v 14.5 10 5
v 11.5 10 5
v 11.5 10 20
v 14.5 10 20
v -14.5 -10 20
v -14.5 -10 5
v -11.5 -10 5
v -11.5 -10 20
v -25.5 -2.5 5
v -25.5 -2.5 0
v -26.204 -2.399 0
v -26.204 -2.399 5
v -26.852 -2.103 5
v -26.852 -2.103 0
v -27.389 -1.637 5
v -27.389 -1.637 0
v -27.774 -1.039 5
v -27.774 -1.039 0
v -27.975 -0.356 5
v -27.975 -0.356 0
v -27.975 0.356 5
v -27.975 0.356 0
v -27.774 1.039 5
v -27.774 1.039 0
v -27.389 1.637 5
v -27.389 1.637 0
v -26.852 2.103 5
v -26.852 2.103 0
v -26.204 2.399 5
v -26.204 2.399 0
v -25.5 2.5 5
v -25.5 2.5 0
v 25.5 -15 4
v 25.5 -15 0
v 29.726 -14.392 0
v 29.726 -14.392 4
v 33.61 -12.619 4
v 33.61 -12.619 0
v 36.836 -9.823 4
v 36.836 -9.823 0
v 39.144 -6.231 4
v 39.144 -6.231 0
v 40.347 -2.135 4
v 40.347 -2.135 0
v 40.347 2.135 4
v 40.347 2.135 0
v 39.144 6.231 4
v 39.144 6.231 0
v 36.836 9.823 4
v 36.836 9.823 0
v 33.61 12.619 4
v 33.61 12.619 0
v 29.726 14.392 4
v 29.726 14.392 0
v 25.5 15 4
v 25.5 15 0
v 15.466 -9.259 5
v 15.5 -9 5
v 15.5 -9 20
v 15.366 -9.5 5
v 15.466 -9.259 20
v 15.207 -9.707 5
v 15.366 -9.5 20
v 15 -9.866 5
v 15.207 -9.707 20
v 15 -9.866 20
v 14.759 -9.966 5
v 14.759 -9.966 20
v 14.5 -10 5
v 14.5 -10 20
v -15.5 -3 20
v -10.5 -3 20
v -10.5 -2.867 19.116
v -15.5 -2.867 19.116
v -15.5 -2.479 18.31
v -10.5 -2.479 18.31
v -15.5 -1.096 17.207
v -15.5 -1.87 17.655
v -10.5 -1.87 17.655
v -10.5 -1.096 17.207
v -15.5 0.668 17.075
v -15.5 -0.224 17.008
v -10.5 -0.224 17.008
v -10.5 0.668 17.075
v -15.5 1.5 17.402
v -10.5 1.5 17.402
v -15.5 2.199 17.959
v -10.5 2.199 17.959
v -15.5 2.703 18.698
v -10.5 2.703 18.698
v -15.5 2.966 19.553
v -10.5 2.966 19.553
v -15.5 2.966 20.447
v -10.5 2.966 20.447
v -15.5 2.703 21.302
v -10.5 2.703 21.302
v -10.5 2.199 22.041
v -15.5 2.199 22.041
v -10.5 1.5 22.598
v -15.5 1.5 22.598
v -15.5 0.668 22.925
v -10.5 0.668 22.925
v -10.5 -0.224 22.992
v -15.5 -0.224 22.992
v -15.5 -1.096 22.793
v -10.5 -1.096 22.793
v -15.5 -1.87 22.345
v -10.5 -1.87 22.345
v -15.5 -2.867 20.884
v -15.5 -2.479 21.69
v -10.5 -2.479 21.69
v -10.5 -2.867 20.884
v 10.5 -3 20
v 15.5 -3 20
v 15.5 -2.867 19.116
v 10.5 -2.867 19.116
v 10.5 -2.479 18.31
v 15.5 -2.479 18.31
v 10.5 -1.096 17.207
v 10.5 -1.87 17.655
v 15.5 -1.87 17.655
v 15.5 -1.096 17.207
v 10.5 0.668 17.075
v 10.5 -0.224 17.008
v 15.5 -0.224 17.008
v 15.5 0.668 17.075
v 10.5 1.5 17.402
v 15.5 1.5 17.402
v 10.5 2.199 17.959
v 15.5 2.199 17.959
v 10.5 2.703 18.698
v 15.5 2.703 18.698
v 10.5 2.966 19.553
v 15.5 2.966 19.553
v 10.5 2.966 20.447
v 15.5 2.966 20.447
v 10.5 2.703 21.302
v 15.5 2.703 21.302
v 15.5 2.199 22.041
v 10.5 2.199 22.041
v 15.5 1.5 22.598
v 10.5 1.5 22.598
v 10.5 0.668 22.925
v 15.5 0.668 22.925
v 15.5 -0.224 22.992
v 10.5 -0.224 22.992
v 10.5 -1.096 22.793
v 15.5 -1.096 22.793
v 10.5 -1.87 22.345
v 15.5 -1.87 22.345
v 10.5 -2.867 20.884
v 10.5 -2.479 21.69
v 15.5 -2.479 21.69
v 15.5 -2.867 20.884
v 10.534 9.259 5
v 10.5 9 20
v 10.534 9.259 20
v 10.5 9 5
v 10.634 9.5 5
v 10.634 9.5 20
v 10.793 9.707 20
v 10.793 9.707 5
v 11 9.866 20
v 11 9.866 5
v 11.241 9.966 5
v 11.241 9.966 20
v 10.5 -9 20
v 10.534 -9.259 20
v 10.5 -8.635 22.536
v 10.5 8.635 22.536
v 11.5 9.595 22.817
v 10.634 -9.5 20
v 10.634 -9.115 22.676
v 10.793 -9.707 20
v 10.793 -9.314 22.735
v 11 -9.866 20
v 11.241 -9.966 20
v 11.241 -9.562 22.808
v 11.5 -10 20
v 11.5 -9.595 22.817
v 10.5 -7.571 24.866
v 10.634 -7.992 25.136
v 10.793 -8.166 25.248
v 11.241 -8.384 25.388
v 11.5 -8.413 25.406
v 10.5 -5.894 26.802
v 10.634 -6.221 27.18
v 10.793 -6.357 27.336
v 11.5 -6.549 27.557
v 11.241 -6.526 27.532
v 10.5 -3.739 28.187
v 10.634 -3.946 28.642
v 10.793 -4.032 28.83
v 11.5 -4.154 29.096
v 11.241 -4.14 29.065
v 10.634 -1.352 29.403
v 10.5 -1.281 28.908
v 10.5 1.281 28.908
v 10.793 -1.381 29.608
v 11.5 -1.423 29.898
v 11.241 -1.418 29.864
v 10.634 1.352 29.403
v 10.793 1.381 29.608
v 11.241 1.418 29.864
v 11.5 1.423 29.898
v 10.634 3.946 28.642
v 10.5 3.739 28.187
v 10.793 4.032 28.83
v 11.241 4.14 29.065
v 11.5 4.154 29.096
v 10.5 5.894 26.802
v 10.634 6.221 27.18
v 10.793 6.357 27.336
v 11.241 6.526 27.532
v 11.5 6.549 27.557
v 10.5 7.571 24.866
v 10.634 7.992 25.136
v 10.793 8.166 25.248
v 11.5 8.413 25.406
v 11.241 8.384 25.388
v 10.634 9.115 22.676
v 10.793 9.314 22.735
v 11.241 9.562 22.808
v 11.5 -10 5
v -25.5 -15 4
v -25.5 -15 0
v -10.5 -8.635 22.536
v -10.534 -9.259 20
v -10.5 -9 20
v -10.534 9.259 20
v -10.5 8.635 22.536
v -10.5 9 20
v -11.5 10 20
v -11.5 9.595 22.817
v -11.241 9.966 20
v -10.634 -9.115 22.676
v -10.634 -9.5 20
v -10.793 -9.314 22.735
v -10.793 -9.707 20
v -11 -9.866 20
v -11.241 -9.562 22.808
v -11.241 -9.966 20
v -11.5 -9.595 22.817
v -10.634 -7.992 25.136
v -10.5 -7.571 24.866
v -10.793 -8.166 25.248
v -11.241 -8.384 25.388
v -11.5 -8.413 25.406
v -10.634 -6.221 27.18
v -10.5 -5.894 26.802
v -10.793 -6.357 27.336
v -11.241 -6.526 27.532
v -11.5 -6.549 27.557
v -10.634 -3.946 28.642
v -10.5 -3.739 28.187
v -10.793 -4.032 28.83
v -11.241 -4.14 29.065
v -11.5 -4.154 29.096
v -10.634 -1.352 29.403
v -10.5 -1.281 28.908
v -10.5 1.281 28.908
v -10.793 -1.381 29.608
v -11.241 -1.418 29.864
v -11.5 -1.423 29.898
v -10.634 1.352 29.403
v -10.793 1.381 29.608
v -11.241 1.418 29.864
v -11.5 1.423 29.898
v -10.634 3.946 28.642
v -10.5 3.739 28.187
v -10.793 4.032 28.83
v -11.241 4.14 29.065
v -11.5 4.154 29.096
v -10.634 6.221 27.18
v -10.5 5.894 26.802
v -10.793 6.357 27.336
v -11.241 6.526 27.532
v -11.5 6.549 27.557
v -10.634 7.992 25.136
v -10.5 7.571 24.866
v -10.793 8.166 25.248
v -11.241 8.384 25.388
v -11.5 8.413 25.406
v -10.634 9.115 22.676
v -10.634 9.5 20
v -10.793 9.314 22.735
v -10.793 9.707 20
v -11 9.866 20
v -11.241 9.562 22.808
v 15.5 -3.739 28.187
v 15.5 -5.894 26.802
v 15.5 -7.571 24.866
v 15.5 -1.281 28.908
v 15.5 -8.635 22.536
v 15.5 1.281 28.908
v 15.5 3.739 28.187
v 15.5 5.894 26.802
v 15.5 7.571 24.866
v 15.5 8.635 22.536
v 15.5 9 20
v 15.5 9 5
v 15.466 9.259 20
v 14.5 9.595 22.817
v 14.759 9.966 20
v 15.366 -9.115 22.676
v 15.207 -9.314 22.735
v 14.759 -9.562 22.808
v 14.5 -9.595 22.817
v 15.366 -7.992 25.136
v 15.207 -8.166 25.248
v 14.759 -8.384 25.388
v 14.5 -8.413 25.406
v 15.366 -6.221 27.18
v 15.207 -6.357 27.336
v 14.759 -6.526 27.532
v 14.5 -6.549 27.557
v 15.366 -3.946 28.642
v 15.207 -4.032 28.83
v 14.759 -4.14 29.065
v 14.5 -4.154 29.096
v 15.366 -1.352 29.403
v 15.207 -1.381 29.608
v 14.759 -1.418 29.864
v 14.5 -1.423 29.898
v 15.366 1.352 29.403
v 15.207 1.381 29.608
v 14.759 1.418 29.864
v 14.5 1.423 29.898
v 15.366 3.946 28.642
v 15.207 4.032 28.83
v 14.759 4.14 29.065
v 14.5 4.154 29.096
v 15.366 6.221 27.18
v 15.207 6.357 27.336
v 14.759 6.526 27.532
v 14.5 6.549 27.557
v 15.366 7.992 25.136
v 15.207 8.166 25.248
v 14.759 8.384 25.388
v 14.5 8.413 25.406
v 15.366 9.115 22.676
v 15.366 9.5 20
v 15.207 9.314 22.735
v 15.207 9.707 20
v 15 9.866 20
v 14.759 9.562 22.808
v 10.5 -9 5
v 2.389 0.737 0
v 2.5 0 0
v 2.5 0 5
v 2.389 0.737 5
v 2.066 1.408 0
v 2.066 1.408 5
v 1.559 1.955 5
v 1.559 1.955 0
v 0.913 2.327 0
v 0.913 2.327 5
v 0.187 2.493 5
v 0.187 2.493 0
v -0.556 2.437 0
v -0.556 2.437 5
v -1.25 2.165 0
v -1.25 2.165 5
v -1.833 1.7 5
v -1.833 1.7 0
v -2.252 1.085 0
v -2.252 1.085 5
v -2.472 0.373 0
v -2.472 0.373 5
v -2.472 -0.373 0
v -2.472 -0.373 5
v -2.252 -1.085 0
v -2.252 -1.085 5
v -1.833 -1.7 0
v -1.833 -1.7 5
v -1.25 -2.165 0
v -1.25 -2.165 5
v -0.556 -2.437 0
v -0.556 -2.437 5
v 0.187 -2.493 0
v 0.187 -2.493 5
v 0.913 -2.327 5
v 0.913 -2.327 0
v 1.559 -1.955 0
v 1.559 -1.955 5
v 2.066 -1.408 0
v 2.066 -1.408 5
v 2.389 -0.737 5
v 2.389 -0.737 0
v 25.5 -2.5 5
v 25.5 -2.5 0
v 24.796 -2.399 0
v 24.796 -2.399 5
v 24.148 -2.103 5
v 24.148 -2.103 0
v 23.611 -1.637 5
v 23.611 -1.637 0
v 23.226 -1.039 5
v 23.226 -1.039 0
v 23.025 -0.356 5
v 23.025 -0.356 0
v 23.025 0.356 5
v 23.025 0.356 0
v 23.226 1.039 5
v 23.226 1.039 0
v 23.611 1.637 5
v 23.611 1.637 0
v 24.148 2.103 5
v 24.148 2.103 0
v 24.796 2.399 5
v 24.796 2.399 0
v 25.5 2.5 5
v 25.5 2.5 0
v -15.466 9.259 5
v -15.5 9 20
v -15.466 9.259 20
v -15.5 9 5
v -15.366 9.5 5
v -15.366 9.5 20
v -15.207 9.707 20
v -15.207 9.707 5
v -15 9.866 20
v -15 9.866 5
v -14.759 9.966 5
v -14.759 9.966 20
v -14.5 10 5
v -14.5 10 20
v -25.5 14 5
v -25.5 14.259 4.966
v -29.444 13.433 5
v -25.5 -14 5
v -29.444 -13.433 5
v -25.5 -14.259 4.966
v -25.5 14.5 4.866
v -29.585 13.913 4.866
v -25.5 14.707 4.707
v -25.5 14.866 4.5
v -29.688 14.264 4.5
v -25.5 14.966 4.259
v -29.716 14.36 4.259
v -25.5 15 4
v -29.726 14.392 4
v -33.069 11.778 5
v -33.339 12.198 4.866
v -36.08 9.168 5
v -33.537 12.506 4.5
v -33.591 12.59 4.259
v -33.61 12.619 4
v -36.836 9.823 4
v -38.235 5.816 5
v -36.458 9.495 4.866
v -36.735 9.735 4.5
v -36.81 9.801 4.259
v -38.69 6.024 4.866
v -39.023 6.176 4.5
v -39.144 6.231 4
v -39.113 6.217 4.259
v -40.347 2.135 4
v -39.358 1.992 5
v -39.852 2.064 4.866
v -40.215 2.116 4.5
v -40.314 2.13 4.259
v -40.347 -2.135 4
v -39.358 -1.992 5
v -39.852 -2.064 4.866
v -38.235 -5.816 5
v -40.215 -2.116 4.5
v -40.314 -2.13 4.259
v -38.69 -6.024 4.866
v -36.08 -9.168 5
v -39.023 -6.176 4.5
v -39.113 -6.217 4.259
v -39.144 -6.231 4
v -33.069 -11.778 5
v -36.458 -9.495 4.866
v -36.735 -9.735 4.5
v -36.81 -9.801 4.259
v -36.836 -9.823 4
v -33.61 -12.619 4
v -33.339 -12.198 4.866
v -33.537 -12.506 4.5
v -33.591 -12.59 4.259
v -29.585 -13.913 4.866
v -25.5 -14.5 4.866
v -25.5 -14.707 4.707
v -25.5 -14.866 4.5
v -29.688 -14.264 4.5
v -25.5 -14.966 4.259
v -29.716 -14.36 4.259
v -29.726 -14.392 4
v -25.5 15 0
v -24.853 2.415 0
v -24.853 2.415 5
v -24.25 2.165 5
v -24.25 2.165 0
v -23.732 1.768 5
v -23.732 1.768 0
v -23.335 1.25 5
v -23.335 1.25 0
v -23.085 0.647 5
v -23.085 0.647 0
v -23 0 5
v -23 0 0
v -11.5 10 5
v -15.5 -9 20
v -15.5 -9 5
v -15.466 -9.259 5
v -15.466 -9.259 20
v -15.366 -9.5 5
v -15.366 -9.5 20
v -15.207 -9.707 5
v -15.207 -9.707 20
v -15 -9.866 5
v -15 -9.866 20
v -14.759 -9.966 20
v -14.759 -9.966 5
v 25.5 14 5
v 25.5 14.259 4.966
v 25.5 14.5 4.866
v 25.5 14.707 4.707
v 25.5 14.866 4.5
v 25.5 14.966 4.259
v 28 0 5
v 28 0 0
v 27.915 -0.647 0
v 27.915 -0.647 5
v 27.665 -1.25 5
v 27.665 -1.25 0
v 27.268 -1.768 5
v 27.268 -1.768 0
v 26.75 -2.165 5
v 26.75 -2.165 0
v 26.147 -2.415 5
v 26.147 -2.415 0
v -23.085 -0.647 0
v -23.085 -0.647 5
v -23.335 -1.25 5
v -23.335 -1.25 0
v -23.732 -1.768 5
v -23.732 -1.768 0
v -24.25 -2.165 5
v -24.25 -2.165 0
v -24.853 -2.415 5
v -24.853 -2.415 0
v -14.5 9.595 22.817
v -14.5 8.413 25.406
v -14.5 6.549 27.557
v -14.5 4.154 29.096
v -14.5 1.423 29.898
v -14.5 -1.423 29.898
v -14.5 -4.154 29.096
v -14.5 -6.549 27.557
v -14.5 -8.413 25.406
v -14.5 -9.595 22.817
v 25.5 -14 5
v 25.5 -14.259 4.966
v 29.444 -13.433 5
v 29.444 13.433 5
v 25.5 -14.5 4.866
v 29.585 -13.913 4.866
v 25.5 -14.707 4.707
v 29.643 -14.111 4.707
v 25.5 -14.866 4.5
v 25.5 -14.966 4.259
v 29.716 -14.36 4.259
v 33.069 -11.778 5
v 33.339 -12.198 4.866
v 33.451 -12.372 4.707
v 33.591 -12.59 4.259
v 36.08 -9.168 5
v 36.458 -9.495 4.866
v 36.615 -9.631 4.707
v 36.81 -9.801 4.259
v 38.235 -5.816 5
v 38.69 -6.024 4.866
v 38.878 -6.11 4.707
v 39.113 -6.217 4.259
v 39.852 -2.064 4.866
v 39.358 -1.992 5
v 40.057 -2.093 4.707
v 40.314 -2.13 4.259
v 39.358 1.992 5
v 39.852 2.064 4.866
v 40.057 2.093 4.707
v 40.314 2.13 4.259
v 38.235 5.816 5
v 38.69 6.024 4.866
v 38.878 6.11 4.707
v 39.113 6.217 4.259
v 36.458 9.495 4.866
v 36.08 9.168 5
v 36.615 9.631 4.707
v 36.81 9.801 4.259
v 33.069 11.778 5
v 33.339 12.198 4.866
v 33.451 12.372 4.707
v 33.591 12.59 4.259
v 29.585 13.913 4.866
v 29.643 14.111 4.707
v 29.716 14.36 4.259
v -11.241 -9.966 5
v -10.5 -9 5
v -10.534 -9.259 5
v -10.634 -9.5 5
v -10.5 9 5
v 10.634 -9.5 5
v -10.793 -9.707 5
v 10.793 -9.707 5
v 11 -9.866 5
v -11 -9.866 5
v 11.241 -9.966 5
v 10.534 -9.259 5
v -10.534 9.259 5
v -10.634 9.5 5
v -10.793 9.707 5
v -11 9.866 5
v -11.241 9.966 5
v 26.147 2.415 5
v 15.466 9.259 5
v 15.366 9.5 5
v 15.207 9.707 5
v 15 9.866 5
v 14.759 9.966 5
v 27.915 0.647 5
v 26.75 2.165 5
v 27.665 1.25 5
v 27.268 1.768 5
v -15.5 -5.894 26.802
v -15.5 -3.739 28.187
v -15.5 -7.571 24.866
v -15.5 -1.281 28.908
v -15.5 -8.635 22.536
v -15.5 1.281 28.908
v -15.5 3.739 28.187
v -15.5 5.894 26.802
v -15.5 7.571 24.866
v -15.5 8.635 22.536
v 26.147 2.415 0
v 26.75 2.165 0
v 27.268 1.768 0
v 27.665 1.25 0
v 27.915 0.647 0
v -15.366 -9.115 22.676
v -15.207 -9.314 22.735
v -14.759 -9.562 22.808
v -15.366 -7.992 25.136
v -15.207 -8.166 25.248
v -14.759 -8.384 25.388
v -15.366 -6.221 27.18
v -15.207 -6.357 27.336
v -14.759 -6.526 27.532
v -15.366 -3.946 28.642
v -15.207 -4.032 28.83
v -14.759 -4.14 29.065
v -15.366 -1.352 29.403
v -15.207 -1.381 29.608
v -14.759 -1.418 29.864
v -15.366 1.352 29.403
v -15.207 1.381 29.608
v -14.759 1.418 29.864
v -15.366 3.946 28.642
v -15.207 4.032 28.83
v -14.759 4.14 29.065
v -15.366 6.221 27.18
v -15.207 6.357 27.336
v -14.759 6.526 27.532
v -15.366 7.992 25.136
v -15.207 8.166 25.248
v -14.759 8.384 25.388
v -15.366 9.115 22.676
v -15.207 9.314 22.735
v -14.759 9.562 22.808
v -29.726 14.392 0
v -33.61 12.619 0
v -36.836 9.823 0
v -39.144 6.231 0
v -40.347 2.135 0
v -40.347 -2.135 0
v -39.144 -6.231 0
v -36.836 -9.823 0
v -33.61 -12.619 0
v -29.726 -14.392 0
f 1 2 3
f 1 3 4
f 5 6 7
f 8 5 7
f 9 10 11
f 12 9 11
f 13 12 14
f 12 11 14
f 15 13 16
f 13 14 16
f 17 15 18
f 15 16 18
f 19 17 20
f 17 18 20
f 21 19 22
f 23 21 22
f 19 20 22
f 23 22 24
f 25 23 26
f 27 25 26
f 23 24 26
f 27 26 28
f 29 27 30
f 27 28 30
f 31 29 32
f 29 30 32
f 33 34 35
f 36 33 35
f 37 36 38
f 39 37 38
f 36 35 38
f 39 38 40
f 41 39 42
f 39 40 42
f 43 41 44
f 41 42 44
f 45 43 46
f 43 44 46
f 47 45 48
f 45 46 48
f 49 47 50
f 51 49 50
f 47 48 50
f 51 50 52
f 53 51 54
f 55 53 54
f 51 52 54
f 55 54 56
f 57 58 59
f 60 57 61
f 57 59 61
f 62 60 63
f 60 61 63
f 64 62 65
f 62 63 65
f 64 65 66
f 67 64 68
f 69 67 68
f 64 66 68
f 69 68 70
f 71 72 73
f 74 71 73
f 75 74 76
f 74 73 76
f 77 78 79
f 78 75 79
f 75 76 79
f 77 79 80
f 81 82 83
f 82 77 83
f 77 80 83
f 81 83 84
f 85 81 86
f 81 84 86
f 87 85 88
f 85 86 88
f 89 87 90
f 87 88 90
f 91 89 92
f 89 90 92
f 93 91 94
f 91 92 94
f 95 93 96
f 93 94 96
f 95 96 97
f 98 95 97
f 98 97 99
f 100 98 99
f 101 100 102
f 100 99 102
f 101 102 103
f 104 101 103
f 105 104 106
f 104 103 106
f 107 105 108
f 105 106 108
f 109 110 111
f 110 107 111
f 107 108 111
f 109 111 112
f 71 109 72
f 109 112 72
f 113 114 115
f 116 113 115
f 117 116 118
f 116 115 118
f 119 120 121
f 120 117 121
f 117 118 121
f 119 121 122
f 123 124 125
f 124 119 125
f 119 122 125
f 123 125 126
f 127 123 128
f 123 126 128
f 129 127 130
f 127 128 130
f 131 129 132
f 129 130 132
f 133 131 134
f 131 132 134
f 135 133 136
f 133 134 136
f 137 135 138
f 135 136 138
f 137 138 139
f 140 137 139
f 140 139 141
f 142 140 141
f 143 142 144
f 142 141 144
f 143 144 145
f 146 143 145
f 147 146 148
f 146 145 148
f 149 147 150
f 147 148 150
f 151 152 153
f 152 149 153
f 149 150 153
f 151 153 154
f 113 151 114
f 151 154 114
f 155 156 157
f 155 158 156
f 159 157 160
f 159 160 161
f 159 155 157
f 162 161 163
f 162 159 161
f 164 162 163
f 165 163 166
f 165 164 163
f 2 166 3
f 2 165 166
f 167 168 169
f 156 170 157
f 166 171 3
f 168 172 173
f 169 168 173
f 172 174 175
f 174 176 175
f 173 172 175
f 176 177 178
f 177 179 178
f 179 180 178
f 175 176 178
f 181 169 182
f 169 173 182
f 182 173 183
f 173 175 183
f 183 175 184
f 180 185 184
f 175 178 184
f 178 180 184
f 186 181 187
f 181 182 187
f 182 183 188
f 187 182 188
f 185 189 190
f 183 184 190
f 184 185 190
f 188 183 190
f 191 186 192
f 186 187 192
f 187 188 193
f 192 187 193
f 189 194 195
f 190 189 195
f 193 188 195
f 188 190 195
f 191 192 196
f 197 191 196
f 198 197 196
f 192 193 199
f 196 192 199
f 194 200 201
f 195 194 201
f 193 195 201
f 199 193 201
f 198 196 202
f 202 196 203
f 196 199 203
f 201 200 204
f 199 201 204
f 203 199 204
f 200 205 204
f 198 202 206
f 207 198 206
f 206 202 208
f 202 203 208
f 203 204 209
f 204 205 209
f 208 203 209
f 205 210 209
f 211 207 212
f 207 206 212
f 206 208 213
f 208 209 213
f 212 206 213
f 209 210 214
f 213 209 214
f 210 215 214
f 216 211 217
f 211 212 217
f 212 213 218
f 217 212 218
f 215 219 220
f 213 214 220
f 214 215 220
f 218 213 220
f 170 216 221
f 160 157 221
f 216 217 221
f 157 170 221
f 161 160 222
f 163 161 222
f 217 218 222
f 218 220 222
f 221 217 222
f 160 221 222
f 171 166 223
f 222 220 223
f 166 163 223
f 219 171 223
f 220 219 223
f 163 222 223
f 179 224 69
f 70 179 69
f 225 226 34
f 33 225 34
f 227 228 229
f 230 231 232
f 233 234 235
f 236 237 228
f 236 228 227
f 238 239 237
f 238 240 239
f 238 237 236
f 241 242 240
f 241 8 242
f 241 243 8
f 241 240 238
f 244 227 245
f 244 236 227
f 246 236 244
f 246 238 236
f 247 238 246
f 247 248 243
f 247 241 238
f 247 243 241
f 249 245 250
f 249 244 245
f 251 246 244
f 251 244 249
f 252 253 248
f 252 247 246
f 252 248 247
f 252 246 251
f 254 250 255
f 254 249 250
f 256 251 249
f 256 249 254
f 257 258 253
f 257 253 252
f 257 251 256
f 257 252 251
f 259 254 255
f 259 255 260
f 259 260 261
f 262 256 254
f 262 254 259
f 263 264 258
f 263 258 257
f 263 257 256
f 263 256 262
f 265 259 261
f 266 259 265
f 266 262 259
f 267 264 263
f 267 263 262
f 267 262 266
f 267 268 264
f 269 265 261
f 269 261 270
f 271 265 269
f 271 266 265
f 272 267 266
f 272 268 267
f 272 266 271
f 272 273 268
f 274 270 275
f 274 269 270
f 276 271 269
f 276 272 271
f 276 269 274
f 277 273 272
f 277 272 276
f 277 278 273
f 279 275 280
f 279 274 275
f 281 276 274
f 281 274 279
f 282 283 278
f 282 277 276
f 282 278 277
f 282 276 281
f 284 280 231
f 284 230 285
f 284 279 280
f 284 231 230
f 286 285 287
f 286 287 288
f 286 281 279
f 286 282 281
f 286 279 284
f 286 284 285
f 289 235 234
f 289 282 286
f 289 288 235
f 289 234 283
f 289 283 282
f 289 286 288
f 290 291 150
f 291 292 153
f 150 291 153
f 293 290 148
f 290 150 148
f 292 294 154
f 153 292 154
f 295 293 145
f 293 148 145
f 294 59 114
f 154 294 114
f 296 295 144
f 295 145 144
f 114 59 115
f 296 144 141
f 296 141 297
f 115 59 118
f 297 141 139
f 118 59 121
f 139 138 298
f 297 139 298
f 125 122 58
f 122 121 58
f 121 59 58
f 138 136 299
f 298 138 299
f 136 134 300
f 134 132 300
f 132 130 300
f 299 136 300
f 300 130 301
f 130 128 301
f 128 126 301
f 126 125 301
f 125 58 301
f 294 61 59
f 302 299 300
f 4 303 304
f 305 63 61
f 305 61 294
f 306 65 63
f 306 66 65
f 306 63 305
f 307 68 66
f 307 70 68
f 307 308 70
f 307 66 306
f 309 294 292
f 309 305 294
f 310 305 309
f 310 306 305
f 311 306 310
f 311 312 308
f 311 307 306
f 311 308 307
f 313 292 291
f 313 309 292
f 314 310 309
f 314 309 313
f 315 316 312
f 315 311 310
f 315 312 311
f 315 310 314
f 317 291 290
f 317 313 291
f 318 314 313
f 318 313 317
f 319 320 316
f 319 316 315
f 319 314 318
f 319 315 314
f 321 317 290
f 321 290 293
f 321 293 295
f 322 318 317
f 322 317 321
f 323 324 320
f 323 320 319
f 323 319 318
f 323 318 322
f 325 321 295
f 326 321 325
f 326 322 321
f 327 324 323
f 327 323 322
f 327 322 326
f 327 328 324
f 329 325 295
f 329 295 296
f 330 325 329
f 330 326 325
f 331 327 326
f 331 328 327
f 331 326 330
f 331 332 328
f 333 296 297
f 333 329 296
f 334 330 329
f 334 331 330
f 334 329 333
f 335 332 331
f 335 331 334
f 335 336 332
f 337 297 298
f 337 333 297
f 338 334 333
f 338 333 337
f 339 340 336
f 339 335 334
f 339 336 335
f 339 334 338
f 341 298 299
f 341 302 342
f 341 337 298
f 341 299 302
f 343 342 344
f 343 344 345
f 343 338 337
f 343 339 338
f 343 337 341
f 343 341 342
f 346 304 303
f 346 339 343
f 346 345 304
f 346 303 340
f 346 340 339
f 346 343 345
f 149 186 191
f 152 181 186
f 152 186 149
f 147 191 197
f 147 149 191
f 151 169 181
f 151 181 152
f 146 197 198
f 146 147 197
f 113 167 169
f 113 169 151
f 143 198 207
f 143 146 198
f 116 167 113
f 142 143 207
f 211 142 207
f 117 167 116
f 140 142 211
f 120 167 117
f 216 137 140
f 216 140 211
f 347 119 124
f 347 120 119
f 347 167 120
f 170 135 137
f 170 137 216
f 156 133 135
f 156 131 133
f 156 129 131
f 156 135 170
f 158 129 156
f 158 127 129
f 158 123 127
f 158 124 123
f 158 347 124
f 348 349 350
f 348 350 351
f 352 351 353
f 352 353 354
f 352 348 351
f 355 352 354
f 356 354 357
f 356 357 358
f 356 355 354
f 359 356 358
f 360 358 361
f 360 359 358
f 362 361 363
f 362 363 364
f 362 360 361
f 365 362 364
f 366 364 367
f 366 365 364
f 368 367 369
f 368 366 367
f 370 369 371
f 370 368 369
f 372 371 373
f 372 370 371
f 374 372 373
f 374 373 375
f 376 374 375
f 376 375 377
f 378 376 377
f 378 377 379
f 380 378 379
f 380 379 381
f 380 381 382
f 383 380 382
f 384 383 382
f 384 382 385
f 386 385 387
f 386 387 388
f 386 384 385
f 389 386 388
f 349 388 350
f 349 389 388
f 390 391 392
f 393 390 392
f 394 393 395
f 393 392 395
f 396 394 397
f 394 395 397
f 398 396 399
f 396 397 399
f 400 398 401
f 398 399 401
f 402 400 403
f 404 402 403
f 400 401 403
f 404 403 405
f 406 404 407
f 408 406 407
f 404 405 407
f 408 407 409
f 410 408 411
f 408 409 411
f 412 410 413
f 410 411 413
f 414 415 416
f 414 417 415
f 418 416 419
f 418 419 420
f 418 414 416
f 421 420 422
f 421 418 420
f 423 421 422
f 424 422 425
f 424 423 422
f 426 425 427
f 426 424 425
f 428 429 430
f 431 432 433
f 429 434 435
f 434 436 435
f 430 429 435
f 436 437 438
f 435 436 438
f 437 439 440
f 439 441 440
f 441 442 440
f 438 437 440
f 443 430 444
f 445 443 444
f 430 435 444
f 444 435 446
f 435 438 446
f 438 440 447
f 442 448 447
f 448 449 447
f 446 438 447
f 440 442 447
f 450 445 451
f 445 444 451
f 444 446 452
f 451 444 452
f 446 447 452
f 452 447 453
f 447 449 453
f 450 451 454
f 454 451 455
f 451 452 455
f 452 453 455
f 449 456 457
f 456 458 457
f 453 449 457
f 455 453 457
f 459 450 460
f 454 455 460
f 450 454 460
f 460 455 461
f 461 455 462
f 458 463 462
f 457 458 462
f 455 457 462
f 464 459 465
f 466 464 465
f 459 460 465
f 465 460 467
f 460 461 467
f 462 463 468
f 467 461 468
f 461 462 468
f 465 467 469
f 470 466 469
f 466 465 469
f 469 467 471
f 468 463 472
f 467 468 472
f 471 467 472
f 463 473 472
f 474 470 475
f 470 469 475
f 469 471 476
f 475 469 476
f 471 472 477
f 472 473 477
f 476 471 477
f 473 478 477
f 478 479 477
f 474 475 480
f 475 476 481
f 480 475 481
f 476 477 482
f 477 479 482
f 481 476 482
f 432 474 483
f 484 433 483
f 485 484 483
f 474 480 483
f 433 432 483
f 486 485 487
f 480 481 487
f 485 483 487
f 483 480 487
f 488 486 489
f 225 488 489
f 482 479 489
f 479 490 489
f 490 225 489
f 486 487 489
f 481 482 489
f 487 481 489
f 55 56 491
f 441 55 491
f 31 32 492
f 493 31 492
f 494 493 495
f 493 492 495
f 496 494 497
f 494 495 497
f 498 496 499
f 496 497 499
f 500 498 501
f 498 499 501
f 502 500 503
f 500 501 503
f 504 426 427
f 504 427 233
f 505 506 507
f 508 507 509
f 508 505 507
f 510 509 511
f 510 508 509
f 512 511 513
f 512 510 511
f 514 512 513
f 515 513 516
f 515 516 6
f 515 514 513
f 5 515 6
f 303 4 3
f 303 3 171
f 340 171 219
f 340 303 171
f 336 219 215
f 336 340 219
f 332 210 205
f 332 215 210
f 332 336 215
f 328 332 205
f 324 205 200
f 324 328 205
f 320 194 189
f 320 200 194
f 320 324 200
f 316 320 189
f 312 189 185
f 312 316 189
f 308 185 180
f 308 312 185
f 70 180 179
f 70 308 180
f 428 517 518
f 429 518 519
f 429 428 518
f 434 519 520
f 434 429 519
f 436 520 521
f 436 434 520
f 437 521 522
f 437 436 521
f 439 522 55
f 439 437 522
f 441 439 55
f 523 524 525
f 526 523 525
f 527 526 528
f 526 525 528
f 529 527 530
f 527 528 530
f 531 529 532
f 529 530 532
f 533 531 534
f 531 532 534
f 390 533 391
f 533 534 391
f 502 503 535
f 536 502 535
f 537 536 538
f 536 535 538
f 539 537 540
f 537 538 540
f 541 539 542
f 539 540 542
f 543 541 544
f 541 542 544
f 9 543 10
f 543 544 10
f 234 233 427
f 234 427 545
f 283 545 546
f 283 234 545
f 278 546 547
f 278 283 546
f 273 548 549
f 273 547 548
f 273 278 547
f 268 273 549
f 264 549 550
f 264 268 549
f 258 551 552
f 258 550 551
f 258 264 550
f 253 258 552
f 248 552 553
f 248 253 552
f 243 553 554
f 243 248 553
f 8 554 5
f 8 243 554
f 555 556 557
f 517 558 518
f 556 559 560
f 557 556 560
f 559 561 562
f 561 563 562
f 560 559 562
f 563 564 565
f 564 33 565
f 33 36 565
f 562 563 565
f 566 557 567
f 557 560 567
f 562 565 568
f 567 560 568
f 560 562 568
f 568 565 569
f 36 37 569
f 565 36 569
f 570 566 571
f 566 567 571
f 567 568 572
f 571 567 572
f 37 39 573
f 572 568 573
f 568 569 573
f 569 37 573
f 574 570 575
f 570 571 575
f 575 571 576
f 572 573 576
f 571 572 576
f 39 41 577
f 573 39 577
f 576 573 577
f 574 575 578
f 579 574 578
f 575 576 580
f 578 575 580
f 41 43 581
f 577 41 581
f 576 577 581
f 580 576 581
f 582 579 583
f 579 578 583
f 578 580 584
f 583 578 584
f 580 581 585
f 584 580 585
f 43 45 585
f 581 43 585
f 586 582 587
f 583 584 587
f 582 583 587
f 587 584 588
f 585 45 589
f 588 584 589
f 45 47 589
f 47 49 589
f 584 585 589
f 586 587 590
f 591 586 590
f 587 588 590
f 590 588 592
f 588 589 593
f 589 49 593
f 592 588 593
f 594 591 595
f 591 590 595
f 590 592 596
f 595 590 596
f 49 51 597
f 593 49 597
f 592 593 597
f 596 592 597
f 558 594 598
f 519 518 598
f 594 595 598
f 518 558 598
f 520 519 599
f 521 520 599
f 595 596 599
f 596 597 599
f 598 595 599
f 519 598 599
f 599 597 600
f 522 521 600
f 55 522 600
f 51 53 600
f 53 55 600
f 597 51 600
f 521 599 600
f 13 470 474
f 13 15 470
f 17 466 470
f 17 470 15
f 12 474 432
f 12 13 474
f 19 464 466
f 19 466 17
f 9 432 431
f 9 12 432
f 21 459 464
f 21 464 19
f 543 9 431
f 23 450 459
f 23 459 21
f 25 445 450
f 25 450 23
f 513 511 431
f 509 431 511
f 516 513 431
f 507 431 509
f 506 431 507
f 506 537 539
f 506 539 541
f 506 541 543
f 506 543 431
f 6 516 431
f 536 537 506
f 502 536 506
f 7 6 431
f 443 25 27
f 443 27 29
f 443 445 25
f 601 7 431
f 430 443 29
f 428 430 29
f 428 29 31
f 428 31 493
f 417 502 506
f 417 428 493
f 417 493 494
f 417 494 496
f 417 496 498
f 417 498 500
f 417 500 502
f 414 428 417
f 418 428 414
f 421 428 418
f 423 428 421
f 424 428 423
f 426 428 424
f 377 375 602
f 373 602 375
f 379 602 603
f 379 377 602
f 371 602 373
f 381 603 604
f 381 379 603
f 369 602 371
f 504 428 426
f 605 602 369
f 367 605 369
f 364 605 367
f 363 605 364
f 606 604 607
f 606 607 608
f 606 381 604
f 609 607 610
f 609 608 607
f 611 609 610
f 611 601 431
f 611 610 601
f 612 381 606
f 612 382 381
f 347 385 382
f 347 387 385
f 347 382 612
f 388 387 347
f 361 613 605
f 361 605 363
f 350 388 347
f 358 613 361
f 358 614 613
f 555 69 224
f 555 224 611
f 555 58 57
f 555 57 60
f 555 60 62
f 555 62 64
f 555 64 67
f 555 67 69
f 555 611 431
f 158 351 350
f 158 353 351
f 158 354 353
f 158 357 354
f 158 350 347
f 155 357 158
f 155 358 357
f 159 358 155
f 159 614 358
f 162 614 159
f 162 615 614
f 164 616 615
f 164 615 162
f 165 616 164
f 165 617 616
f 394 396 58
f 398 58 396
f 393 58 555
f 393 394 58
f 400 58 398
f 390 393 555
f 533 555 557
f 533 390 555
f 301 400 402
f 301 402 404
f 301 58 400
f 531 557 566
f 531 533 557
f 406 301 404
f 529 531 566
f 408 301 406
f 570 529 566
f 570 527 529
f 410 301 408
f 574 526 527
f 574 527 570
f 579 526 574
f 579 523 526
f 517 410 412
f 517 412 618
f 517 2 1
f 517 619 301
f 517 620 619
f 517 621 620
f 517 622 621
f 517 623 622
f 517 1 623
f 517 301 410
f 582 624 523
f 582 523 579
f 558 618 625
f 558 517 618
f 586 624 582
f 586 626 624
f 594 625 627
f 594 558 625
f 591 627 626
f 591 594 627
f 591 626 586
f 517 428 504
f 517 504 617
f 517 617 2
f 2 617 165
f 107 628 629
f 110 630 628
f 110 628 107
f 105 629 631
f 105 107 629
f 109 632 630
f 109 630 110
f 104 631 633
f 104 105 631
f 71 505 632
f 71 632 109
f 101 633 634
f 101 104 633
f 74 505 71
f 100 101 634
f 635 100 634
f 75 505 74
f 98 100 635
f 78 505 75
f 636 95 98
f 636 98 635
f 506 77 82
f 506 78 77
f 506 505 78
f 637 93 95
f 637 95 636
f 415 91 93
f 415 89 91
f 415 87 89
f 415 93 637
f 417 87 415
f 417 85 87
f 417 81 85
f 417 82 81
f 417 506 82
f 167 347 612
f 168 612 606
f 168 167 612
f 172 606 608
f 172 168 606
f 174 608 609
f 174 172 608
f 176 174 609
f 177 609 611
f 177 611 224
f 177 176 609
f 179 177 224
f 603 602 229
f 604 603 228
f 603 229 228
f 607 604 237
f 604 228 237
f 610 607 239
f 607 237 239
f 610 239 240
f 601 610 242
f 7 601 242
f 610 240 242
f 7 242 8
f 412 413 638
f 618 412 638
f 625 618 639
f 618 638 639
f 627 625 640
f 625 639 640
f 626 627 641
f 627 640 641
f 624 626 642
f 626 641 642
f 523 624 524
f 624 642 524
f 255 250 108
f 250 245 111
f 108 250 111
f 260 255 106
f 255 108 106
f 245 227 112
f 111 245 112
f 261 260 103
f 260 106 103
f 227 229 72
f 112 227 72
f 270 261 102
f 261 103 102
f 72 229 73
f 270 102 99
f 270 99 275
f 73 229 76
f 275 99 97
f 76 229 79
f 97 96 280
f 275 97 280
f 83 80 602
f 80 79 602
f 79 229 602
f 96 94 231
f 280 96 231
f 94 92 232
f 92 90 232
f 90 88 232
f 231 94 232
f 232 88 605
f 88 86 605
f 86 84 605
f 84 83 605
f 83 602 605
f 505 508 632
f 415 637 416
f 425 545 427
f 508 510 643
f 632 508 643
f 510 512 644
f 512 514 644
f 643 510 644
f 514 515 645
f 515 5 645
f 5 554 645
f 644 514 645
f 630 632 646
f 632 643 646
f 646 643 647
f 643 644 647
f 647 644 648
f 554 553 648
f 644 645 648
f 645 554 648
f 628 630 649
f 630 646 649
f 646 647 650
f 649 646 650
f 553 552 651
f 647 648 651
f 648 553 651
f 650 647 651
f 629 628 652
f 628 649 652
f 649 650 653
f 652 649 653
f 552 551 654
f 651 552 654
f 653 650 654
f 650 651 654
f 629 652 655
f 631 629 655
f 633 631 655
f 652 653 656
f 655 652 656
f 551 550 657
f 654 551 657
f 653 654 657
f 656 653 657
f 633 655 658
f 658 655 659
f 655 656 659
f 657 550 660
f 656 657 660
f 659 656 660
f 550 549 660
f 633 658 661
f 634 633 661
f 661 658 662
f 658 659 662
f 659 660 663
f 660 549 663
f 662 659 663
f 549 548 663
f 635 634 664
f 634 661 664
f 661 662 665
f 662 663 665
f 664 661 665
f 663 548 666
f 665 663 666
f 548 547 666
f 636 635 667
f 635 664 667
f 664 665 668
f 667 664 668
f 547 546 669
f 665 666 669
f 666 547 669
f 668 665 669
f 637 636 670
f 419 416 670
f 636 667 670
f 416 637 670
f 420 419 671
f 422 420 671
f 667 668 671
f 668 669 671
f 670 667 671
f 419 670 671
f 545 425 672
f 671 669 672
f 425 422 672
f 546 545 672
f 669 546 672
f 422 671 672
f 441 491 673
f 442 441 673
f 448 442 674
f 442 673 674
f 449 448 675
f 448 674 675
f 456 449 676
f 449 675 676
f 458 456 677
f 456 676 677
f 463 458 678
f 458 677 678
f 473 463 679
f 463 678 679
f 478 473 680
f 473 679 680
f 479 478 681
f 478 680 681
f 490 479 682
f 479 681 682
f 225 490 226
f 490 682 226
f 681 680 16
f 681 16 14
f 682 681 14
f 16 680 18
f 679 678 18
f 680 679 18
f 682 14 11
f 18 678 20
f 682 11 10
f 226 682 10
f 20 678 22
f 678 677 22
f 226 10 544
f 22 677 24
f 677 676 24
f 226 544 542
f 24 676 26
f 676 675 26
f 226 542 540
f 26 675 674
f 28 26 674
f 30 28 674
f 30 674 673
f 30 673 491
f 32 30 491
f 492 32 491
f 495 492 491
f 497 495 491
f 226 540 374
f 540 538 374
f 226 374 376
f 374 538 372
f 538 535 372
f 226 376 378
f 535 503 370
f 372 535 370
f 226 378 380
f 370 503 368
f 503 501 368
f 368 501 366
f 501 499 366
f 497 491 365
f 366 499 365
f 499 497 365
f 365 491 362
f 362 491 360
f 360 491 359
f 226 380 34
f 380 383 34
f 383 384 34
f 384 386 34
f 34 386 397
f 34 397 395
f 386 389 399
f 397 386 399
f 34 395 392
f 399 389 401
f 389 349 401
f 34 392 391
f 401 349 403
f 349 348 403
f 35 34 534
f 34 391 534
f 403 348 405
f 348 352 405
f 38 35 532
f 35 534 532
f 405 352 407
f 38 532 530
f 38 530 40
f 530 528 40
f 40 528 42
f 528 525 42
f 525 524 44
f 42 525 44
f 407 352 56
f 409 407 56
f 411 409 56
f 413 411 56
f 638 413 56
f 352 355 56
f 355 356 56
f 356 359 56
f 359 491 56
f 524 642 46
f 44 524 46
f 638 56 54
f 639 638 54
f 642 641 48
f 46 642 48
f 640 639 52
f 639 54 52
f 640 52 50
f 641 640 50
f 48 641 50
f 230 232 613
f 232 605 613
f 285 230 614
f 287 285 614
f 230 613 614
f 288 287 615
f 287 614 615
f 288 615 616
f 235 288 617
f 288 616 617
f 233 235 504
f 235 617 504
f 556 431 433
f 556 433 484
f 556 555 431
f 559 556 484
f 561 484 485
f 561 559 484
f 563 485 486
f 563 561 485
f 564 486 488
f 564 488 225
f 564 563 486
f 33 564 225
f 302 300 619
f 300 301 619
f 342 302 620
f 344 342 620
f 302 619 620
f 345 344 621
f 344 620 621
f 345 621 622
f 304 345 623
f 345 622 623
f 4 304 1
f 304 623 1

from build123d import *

# Parameters (mm, degrees)
F0_R      = 2.5
F1_DEPTH  = 5
F2_W      = 5
F2_H      = 20
F3_DEPTH  = 15
F4_DEPTH  = 15
F5_R      = 10
F5_R_2    = 3
F6_DEPTH  = 5
F7_DEPTH  = 5
F8_R      = 10
F8_R_2    = 3
F9_DEPTH  = 5
F10_DEPTH = 5
F11_R     = 1
F12_R     = 1


with BuildPart() as f1:
    # F0 (on Top) → F1 (new body)
    with BuildSketch(Plane.XY):
        with BuildLine():
            ThreePointArc((-10.5, 0), (-14.8933982822, -10.6066017178), (-25.5, -15))
            Line((-25.5, -15), (25.5, -15))
            ThreePointArc((25.5, -15), (10.5, 0), (25.5, 15))
            Line((25.5, 15), (-25.5, 15))
            ThreePointArc((-25.5, 15), (-14.8933982822, 10.6066017178), (-10.5, 0))
        make_face()
        Circle(F0_R, mode=Mode.SUBTRACT)
        with BuildLine():
            ThreePointArc((-25.5, 15), (-40.5, 0), (-25.5, -15))
            Line((-25.5, -15), (-25.5, -2.5))
            ThreePointArc((-25.5, -2.5), (-28, 0), (-25.5, 2.5))
            Line((-25.5, 2.5), (-25.5, 15))
        make_face()
        with BuildLine():
            Line((-25.5, -2.5), (-25.5, -15))
            ThreePointArc((-25.5, -15), (-14.8933982822, -10.6066017178), (-10.5, 0))
            ThreePointArc((-10.5, 0), (-14.8933982822, 10.6066017178), (-25.5, 15))
            Line((-25.5, 15), (-25.5, 2.5))
            ThreePointArc((-25.5, 2.5), (-23.732233047, 1.767766953), (-23, 0))
            ThreePointArc((-23, 0), (-23.732233047, -1.767766953), (-25.5, -2.5))
        make_face()
        with BuildLine():
            ThreePointArc((25.5, 15), (10.5, 0), (25.5, -15))
            Line((25.5, -15), (25.5, -2.5))
            ThreePointArc((25.5, -2.5), (23, 0), (25.5, 2.5))
            Line((25.5, 2.5), (25.5, 15))
        make_face()
        with BuildLine():
            Line((25.5, -2.5), (25.5, -15))
            ThreePointArc((25.5, -15), (36.1066017178, -10.6066017178), (40.5, 0))
            ThreePointArc((40.5, 0), (36.1066017178, 10.6066017178), (25.5, 15))
            Line((25.5, 15), (25.5, 2.5))
            ThreePointArc((25.5, 2.5), (27.267766953, 1.767766953), (28, 0))
            ThreePointArc((28, 0), (27.267766953, -1.767766953), (25.5, -2.5))
        make_face()
    extrude(amount=F1_DEPTH)

    # F2 (on face) → F3 (join)
    with BuildSketch(Plane.XY.offset(5)):
        with Locations((13, 0)):
            Rectangle(F2_W, F2_H)
    extrude(amount=F3_DEPTH)

    # F2 (on face) → F4 (join)
    with BuildSketch(Plane.XY.offset(5)):
        with Locations((-13, 0)):
            Rectangle(F2_W, F2_H)
    extrude(amount=F4_DEPTH)

    # F5 (on face) → F6 (join)
    with BuildSketch(Plane.YZ.offset(-10.5)):
        with Locations((0, 20)):
            Circle(F5_R)
        with Locations((0, 20)):
            Circle(F5_R_2, mode=Mode.SUBTRACT)
    extrude(amount=-F6_DEPTH)

    # F5 (on face) → F7 (cut)
    with BuildSketch(Plane.YZ.offset(-10.5)):
        with BuildLine():
            ThreePointArc((-3, 20), (0, 17), (3, 20))
            Line((3, 20), (-3, 20))
        make_face()
    extrude(amount=-F7_DEPTH, mode=Mode.SUBTRACT)

    # F8 (on face) → F9 (join)
    with BuildSketch(Plane.YZ.offset(15.5)):
        with Locations((0, 20)):
            Circle(F8_R)
        with Locations((0, 20)):
            Circle(F8_R_2, mode=Mode.SUBTRACT)
    extrude(amount=-F9_DEPTH)

    # F8 (on face) → F10 (cut)
    with BuildSketch(Plane.YZ.offset(15.5)):
        with BuildLine():
            ThreePointArc((-3, 20), (0, 17), (3, 20))
            Line((3, 20), (-3, 20))
        make_face()
    extrude(amount=-F10_DEPTH, mode=Mode.SUBTRACT)

    # F11
    f11_edges = [f1.edges().sort_by_distance(p)[0] for p in [
        (-10.5, -10, 12.5),
        (15.5, -10, 12.5),
        (-15.5, -10, 12.5),
        (10.5, -10, 12.5),
    ]]
    fillet(f11_edges, radius=F11_R)

    # F12
    f12_edges = [f1.edges().sort_by_distance(p)[0] for p in [
        (0, -15, 5),
    ]]
    fillet(f12_edges, radius=F12_R)


solid = f1.part
